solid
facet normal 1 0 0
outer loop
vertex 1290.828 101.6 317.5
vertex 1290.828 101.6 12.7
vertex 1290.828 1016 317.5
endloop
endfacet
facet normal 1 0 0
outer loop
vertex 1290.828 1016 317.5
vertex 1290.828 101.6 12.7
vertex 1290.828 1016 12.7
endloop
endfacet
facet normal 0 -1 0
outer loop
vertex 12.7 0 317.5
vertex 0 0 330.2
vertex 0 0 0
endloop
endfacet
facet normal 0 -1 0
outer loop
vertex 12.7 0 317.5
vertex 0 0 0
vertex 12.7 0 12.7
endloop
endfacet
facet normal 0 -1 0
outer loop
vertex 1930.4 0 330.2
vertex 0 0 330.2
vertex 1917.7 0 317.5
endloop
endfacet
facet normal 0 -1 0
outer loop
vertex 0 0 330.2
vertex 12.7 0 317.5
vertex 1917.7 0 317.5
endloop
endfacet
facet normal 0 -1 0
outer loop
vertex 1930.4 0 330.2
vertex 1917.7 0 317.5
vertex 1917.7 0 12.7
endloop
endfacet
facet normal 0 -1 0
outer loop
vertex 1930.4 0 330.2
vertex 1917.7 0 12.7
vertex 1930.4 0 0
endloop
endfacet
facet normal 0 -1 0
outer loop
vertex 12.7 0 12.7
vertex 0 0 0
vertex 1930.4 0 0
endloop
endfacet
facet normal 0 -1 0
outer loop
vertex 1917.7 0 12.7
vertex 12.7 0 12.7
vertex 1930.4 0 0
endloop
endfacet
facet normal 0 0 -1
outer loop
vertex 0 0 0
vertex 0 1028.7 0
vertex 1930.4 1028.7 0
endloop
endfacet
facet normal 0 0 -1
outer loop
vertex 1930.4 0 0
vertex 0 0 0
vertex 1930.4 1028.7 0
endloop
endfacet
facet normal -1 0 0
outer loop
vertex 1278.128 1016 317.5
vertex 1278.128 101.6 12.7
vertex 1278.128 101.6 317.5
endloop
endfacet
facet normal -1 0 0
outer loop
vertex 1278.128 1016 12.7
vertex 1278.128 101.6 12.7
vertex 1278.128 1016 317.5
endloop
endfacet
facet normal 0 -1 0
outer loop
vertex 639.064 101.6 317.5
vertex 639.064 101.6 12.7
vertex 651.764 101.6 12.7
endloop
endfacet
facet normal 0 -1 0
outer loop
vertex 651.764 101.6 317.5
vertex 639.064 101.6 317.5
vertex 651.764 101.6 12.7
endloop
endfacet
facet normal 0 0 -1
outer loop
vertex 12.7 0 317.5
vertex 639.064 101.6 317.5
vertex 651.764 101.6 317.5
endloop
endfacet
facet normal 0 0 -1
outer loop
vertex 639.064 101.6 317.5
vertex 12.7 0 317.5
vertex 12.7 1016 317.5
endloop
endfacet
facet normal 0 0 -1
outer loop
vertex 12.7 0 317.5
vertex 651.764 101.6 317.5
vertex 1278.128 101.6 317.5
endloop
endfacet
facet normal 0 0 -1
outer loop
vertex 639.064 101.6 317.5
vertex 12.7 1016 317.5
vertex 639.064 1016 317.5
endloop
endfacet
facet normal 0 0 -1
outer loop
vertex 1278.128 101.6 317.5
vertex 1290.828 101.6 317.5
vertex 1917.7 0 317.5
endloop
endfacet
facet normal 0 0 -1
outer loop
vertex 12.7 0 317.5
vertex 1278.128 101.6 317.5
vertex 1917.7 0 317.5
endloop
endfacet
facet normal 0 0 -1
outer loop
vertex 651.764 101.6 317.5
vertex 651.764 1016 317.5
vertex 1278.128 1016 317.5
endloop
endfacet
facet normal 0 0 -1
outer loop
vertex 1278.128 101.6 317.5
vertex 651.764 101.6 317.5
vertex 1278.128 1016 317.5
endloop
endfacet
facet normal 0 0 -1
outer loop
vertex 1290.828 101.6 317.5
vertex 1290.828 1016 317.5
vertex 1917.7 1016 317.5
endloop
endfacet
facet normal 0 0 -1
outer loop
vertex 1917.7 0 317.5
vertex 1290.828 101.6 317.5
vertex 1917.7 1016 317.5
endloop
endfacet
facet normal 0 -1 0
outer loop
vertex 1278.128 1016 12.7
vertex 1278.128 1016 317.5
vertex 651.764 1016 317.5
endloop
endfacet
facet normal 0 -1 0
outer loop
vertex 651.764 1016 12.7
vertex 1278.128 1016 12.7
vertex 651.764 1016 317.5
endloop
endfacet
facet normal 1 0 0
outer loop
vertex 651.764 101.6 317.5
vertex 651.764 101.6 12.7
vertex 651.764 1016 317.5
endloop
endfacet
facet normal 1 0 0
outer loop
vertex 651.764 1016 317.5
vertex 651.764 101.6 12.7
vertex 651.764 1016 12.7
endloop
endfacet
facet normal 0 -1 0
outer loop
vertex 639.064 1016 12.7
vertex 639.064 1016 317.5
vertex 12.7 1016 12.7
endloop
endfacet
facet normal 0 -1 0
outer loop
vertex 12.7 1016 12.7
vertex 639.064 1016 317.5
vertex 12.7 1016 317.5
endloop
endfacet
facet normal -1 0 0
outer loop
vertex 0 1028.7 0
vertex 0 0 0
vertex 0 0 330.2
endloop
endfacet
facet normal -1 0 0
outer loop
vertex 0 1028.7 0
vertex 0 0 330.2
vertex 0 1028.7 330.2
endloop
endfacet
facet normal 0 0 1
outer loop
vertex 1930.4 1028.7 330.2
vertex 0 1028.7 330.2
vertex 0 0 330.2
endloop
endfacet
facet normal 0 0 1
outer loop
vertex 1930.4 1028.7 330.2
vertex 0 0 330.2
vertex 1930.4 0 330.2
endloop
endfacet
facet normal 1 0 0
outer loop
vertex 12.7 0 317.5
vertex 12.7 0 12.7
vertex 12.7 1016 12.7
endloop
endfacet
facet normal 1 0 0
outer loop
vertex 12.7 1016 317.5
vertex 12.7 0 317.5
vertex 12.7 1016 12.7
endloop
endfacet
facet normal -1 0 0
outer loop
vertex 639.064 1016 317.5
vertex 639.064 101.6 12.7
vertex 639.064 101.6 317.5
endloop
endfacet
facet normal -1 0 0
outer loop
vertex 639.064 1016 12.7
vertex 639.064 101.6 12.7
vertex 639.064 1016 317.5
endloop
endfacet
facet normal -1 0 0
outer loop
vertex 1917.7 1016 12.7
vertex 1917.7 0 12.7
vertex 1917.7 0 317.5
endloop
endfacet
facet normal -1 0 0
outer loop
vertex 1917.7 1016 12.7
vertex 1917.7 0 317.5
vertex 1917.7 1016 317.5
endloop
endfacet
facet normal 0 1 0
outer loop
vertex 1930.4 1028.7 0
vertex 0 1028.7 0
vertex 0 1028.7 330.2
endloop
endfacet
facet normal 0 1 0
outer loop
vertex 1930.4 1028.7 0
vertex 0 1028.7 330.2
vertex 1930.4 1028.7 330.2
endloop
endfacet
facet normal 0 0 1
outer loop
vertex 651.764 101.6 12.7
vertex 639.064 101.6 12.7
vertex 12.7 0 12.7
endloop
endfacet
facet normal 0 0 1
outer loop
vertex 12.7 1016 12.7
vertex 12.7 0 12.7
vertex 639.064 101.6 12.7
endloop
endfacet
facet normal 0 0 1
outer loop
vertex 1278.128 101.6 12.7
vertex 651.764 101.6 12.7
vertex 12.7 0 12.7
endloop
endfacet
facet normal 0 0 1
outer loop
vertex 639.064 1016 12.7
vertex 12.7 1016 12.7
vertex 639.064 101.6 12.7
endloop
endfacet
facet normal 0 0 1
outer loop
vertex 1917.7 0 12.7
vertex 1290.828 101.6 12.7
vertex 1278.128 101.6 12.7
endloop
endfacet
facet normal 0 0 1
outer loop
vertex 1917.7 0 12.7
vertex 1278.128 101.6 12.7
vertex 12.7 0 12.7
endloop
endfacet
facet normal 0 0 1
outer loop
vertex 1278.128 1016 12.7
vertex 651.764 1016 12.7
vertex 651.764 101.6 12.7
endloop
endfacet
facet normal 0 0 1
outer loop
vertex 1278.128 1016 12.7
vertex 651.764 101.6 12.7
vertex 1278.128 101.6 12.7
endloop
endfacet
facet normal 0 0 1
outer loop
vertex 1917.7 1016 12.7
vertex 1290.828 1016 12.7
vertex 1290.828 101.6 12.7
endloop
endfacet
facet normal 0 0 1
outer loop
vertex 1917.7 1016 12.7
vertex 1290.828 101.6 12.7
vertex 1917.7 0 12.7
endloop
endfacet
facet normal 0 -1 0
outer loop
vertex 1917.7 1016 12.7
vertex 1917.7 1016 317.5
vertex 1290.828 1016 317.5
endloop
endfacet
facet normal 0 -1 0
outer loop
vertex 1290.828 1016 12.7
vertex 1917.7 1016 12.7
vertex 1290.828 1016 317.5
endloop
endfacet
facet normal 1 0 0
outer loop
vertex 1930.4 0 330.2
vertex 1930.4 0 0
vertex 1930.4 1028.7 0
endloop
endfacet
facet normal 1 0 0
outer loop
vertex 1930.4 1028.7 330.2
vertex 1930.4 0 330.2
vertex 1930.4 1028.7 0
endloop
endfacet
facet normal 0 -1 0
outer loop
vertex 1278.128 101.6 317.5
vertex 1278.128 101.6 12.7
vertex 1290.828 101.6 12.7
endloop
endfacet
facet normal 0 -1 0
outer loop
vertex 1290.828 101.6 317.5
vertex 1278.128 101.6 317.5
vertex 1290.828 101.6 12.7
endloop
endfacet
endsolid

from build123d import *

# Parameters (mm, degrees)
F0_W     = 1930.4
F0_H     = 1028.7
F1_DEPTH = 12.7
F2_W     = 12.7
F2_H     = 1028.7
F2_H_2   = 927.1
F3_DEPTH = 304.8
F4_W     = 1930.4
F4_H     = 1028.7
F5_DEPTH = 12.7
F6_W     = 1930.4
F6_H     = 330.2
F7_DEPTH = 12.7


with BuildPart() as f1:
    # F0 (on Top) → F1 (new body)
    with BuildSketch(Plane.XY):
        with Locations((965.2, 514.35)):
            Rectangle(F0_W, F0_H)
    extrude(amount=F1_DEPTH)

    # F2 (on face) → F3 (join)
    with BuildSketch(Plane.XY.offset(12.7)):
        with Locations((6.35, 514.35)):
            Rectangle(F2_W, F2_H)
        with Locations((1924.05, 514.35)):
            Rectangle(F2_W, F2_H)
        with Locations((645.414, 565.15)):
            Rectangle(F2_W, F2_H_2)
        with Locations((1284.478, 565.15)):
            Rectangle(F2_W, F2_H_2)
    extrude(amount=F3_DEPTH)

    # F4 (on face) → F5 (join)
    with BuildSketch(Plane.XY.offset(317.5)):
        with Locations((965.2, 514.35)):
            Rectangle(F4_W, F4_H)
    extrude(amount=F5_DEPTH)

    # F6 (on face) → F7 (join)
    with BuildSketch(Plane(origin=(0, 1028.7, 0), x_dir=(-1, 0, 0), z_dir=(0, 1, 0))):
        with Locations((-965.2, 165.1)):
            Rectangle(F6_W, F6_H)
    extrude(amount=-F7_DEPTH)


solid = f1.part
